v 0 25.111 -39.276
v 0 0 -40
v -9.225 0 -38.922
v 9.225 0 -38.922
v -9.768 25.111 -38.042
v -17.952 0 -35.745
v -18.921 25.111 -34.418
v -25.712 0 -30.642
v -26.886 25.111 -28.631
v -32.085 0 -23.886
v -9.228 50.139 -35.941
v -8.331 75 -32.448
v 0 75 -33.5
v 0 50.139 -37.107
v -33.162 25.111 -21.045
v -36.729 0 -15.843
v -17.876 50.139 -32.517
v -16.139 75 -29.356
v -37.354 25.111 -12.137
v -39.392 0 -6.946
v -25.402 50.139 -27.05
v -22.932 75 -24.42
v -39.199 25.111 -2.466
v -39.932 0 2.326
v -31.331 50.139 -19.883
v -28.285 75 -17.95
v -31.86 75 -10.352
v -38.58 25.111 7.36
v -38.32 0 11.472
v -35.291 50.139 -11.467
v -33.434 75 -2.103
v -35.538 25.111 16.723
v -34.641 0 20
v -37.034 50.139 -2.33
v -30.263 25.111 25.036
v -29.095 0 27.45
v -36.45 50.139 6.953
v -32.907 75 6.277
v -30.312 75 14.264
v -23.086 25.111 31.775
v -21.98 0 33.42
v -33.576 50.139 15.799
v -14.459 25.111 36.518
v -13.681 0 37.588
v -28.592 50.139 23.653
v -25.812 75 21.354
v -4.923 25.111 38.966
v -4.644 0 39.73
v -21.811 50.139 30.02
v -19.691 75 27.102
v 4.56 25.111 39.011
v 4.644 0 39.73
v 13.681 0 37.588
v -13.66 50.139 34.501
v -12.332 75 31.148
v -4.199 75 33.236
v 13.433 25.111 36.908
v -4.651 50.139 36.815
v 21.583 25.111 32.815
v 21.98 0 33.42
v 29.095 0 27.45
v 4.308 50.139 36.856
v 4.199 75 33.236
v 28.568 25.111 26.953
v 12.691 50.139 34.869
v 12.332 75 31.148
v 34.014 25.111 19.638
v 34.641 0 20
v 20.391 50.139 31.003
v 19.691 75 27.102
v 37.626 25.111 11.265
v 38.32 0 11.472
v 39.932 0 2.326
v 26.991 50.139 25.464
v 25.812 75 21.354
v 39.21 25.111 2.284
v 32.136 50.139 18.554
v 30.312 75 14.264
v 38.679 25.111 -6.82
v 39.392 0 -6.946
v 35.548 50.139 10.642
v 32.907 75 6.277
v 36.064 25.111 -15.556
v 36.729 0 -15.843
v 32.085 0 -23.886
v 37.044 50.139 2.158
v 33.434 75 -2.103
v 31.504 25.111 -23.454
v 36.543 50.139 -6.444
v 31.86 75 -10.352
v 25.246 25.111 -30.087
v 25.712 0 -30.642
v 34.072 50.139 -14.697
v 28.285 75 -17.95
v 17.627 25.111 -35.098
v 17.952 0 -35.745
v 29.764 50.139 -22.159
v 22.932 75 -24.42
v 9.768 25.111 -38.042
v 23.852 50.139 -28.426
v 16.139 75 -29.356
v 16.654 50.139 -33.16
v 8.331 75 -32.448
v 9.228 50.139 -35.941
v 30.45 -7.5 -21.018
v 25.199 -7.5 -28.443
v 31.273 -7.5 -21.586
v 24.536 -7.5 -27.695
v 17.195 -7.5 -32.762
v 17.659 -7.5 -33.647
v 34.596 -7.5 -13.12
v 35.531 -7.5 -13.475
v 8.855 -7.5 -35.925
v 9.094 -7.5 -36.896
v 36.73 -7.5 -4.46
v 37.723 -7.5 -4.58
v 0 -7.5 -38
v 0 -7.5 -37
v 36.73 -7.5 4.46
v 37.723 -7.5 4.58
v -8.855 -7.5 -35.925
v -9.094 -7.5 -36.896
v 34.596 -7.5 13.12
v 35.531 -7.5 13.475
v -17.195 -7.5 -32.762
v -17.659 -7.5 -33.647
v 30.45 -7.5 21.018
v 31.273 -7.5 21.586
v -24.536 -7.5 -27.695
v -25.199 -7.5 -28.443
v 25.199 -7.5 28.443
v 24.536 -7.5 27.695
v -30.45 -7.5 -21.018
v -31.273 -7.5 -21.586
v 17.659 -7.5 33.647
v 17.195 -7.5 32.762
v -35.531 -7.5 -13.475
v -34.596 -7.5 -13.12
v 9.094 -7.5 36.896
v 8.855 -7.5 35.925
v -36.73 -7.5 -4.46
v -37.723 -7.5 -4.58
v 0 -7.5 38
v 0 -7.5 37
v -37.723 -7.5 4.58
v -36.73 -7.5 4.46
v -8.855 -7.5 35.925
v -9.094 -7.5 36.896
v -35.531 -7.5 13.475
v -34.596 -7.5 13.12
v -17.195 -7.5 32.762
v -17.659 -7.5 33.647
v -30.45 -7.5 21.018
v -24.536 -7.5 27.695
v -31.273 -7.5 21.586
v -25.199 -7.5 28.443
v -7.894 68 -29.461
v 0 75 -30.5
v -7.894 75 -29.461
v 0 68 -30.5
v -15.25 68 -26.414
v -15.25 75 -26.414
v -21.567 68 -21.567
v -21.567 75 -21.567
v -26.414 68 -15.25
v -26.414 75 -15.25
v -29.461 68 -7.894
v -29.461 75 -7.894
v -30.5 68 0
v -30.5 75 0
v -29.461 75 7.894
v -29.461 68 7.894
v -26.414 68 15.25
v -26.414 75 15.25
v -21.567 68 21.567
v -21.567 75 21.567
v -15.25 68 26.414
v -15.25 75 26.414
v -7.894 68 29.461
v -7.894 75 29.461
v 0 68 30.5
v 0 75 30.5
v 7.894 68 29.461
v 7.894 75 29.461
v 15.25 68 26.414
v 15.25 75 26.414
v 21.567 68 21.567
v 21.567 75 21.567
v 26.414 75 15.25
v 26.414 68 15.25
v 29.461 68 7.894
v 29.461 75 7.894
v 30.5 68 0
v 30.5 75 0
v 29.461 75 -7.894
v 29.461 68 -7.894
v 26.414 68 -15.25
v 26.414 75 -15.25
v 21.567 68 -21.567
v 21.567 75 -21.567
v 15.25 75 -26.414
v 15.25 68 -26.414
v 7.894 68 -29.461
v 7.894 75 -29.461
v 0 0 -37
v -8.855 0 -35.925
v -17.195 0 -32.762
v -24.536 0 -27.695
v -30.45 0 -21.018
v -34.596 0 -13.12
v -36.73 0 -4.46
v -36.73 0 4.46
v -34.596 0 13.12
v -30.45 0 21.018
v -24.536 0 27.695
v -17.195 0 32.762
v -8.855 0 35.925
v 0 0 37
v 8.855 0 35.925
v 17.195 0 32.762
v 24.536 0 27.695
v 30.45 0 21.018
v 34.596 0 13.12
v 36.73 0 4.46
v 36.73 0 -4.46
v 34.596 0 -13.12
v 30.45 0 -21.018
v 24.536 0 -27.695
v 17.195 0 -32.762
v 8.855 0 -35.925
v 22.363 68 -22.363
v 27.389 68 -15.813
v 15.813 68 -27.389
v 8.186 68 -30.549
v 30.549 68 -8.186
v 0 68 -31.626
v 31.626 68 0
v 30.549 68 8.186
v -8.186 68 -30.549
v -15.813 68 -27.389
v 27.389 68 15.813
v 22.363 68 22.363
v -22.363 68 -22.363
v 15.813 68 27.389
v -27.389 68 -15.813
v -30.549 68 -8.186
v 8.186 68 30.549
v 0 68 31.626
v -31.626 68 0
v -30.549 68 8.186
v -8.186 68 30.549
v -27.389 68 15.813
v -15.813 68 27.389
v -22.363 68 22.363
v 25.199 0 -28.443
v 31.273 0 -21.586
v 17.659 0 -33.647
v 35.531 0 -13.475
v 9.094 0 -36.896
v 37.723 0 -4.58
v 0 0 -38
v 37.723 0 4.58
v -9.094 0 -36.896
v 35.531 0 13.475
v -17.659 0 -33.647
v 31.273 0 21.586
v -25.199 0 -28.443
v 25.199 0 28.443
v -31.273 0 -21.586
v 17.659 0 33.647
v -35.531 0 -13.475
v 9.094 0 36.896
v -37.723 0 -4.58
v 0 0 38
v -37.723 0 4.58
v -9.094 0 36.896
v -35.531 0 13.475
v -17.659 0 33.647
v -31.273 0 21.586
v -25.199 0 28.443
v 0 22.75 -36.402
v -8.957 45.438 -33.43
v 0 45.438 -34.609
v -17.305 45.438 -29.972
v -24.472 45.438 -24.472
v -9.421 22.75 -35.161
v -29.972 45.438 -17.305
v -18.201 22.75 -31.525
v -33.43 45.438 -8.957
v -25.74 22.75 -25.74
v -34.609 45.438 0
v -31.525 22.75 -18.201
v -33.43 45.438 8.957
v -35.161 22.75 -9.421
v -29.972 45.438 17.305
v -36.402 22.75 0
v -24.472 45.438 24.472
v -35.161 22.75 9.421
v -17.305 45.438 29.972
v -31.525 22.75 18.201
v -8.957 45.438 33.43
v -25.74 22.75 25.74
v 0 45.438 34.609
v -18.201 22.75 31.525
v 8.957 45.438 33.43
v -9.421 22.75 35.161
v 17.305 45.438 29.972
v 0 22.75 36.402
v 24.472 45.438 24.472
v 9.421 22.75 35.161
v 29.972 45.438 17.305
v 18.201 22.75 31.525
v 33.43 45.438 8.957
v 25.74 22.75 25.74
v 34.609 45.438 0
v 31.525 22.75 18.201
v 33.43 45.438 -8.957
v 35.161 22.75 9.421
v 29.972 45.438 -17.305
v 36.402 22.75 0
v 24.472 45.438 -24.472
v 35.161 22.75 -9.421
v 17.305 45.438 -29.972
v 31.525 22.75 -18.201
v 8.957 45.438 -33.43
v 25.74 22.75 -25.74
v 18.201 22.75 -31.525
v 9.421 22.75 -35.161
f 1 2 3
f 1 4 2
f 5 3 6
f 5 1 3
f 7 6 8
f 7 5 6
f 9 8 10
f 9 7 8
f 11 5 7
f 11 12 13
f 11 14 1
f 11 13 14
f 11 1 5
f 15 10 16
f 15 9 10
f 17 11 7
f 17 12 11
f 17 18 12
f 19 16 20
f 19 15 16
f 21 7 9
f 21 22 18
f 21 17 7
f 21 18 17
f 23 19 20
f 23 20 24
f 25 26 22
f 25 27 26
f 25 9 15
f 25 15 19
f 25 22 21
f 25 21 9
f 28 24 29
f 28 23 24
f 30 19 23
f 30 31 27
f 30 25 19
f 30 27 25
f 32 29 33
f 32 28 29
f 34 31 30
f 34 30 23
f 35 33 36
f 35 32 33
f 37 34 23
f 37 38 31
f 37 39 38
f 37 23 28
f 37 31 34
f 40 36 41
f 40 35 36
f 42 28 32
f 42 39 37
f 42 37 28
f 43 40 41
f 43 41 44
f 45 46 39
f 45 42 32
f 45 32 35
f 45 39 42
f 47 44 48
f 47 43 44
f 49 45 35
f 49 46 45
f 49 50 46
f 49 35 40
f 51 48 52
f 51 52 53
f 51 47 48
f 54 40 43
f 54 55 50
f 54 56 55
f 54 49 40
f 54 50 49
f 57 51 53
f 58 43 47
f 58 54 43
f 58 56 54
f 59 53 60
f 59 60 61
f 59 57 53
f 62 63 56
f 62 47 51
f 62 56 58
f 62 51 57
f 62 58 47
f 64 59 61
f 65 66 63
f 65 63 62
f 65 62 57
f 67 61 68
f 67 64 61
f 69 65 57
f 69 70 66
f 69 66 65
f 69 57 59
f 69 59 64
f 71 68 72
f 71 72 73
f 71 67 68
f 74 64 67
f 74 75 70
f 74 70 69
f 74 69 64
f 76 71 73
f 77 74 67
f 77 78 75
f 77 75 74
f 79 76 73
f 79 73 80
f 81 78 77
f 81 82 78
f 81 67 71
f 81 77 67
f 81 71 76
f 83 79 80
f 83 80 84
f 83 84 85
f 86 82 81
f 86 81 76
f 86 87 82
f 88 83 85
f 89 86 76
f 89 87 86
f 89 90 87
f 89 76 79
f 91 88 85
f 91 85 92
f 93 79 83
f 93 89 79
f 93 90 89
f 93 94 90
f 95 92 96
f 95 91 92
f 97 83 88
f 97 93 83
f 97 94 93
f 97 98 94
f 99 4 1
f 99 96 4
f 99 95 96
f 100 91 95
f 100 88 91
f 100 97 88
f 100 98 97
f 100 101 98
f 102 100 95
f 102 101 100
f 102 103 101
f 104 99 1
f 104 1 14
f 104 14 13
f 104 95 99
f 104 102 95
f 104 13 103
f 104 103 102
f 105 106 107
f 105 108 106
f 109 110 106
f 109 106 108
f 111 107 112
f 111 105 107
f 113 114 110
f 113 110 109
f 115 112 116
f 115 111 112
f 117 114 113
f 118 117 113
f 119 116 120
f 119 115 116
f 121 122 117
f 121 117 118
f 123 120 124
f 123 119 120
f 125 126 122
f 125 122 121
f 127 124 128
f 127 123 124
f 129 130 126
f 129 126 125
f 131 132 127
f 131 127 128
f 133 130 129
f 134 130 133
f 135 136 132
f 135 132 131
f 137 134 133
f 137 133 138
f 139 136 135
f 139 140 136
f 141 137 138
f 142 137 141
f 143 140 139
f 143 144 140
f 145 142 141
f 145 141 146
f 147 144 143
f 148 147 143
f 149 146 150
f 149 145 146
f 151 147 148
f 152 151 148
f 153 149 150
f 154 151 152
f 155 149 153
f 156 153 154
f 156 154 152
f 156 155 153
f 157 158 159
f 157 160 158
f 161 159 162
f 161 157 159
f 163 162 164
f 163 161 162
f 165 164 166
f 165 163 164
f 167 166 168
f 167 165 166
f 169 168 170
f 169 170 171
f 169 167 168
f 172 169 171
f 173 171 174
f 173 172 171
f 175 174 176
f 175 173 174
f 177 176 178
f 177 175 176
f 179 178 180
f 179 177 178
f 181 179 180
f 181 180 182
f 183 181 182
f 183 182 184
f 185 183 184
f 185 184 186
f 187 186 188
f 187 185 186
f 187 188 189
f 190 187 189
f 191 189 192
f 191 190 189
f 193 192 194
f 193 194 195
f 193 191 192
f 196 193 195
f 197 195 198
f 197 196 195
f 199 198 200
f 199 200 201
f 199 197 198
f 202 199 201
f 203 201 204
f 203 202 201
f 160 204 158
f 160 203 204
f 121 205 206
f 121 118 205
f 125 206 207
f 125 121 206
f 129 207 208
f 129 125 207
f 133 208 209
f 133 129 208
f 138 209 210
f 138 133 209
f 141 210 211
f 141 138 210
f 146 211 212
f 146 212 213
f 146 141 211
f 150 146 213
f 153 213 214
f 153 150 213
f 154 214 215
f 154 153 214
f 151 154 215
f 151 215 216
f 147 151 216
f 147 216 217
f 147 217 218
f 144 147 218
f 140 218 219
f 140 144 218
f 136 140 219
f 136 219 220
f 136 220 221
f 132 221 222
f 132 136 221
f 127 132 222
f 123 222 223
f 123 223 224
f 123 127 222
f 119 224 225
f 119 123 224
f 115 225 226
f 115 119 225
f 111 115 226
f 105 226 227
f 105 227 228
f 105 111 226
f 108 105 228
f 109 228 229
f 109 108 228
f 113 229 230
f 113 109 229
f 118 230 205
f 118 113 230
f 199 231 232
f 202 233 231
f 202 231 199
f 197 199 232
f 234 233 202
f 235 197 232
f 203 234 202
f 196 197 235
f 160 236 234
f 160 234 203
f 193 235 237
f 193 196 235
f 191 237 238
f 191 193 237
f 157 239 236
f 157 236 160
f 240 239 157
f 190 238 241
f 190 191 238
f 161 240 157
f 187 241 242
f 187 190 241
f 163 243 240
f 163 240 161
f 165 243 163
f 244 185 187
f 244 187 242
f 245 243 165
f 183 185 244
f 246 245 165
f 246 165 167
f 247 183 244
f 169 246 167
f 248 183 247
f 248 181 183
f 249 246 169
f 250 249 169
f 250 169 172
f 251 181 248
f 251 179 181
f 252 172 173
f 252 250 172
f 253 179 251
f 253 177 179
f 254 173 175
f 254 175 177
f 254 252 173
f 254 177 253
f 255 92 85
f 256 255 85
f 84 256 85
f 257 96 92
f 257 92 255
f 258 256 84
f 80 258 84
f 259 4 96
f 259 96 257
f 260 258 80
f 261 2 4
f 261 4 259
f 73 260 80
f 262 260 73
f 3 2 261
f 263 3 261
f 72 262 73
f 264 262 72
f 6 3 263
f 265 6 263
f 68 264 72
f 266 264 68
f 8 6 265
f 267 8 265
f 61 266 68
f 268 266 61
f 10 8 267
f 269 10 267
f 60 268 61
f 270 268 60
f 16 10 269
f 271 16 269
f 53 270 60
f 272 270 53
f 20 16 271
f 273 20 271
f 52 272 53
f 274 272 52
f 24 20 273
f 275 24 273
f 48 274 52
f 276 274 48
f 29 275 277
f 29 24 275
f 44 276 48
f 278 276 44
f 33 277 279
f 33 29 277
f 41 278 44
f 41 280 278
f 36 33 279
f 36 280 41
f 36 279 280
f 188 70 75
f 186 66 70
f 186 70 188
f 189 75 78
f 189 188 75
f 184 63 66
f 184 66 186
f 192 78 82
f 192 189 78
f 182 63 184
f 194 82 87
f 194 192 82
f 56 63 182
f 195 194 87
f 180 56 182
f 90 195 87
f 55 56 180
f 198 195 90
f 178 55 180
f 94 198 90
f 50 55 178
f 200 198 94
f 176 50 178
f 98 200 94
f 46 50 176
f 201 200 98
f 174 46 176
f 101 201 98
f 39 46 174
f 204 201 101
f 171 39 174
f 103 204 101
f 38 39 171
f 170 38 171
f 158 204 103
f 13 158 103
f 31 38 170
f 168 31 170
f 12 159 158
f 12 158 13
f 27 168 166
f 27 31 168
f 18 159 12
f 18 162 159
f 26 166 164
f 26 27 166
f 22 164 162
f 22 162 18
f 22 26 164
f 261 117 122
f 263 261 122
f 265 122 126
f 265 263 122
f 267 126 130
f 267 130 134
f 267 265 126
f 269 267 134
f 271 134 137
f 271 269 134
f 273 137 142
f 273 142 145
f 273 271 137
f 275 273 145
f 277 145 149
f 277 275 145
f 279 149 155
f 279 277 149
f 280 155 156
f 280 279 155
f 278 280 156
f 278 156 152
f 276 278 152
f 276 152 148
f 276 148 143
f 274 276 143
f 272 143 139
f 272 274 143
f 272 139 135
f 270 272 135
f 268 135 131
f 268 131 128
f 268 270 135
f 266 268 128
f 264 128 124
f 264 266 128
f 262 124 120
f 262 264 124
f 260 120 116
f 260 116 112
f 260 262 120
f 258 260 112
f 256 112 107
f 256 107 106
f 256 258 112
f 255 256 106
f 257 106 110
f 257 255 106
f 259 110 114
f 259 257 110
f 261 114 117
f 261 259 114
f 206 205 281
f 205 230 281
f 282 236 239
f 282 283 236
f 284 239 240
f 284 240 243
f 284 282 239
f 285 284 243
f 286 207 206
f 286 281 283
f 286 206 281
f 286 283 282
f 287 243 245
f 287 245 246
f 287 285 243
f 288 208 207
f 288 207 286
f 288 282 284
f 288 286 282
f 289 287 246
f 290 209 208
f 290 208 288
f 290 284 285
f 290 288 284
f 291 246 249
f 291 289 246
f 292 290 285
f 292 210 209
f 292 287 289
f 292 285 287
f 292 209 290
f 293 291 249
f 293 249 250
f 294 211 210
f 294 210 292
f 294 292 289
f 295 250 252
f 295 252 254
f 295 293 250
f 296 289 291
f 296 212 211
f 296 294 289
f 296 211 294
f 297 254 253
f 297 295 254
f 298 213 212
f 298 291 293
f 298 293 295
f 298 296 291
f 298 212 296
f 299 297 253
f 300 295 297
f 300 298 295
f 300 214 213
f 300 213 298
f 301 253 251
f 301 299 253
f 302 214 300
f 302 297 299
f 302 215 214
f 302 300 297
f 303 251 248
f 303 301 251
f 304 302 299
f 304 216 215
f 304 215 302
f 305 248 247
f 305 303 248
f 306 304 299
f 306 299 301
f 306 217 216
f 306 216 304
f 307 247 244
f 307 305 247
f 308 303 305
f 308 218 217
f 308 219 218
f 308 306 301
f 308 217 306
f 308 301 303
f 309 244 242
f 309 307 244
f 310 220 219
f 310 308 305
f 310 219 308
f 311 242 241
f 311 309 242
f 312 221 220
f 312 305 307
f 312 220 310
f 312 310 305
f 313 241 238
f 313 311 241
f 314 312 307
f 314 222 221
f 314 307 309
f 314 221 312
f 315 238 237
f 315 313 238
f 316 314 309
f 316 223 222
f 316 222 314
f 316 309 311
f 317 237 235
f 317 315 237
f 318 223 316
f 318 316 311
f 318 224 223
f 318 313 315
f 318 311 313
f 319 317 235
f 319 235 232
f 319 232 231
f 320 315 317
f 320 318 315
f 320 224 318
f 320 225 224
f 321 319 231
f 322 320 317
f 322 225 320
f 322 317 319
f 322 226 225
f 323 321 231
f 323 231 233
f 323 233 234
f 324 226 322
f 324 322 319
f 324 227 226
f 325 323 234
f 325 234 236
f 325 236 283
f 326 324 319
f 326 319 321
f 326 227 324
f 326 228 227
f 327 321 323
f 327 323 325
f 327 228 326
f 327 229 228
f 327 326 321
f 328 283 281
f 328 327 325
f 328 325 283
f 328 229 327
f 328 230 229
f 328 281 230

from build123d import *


with BuildPart() as part:
    # Sketch1 → Revolve1 (revolve)
    with BuildSketch(Plane.XY, mode=Mode.PRIVATE) as revolve1_sk:
        with BuildLine():
            Line((37, 0), (37, -7.5))
            Line((37, -7.5), (38, -7.5))
            Line((38, -7.5), (38, 0))
            Line((38, 0), (40, 0))
            ThreePointArc((40, 0), (38.371960017, 37.640569868), (33.5, 75))
            Line((33.5, 75), (30.5, 75))
            Line((30.5, 75), (30.5, 68))
            Line((30.5, 68), (31.626449106, 68))
            ThreePointArc((31.626449106, 68), (35.654521568, 34.105993056), (37, 0))
        make_face()
    revolve(revolve1_sk.sketch.rotate(Axis((0, 0, 0), (0, 1, 0)), 90), axis=Axis((0, 0, 0), (0, 1, 0)))


solid = part.part
